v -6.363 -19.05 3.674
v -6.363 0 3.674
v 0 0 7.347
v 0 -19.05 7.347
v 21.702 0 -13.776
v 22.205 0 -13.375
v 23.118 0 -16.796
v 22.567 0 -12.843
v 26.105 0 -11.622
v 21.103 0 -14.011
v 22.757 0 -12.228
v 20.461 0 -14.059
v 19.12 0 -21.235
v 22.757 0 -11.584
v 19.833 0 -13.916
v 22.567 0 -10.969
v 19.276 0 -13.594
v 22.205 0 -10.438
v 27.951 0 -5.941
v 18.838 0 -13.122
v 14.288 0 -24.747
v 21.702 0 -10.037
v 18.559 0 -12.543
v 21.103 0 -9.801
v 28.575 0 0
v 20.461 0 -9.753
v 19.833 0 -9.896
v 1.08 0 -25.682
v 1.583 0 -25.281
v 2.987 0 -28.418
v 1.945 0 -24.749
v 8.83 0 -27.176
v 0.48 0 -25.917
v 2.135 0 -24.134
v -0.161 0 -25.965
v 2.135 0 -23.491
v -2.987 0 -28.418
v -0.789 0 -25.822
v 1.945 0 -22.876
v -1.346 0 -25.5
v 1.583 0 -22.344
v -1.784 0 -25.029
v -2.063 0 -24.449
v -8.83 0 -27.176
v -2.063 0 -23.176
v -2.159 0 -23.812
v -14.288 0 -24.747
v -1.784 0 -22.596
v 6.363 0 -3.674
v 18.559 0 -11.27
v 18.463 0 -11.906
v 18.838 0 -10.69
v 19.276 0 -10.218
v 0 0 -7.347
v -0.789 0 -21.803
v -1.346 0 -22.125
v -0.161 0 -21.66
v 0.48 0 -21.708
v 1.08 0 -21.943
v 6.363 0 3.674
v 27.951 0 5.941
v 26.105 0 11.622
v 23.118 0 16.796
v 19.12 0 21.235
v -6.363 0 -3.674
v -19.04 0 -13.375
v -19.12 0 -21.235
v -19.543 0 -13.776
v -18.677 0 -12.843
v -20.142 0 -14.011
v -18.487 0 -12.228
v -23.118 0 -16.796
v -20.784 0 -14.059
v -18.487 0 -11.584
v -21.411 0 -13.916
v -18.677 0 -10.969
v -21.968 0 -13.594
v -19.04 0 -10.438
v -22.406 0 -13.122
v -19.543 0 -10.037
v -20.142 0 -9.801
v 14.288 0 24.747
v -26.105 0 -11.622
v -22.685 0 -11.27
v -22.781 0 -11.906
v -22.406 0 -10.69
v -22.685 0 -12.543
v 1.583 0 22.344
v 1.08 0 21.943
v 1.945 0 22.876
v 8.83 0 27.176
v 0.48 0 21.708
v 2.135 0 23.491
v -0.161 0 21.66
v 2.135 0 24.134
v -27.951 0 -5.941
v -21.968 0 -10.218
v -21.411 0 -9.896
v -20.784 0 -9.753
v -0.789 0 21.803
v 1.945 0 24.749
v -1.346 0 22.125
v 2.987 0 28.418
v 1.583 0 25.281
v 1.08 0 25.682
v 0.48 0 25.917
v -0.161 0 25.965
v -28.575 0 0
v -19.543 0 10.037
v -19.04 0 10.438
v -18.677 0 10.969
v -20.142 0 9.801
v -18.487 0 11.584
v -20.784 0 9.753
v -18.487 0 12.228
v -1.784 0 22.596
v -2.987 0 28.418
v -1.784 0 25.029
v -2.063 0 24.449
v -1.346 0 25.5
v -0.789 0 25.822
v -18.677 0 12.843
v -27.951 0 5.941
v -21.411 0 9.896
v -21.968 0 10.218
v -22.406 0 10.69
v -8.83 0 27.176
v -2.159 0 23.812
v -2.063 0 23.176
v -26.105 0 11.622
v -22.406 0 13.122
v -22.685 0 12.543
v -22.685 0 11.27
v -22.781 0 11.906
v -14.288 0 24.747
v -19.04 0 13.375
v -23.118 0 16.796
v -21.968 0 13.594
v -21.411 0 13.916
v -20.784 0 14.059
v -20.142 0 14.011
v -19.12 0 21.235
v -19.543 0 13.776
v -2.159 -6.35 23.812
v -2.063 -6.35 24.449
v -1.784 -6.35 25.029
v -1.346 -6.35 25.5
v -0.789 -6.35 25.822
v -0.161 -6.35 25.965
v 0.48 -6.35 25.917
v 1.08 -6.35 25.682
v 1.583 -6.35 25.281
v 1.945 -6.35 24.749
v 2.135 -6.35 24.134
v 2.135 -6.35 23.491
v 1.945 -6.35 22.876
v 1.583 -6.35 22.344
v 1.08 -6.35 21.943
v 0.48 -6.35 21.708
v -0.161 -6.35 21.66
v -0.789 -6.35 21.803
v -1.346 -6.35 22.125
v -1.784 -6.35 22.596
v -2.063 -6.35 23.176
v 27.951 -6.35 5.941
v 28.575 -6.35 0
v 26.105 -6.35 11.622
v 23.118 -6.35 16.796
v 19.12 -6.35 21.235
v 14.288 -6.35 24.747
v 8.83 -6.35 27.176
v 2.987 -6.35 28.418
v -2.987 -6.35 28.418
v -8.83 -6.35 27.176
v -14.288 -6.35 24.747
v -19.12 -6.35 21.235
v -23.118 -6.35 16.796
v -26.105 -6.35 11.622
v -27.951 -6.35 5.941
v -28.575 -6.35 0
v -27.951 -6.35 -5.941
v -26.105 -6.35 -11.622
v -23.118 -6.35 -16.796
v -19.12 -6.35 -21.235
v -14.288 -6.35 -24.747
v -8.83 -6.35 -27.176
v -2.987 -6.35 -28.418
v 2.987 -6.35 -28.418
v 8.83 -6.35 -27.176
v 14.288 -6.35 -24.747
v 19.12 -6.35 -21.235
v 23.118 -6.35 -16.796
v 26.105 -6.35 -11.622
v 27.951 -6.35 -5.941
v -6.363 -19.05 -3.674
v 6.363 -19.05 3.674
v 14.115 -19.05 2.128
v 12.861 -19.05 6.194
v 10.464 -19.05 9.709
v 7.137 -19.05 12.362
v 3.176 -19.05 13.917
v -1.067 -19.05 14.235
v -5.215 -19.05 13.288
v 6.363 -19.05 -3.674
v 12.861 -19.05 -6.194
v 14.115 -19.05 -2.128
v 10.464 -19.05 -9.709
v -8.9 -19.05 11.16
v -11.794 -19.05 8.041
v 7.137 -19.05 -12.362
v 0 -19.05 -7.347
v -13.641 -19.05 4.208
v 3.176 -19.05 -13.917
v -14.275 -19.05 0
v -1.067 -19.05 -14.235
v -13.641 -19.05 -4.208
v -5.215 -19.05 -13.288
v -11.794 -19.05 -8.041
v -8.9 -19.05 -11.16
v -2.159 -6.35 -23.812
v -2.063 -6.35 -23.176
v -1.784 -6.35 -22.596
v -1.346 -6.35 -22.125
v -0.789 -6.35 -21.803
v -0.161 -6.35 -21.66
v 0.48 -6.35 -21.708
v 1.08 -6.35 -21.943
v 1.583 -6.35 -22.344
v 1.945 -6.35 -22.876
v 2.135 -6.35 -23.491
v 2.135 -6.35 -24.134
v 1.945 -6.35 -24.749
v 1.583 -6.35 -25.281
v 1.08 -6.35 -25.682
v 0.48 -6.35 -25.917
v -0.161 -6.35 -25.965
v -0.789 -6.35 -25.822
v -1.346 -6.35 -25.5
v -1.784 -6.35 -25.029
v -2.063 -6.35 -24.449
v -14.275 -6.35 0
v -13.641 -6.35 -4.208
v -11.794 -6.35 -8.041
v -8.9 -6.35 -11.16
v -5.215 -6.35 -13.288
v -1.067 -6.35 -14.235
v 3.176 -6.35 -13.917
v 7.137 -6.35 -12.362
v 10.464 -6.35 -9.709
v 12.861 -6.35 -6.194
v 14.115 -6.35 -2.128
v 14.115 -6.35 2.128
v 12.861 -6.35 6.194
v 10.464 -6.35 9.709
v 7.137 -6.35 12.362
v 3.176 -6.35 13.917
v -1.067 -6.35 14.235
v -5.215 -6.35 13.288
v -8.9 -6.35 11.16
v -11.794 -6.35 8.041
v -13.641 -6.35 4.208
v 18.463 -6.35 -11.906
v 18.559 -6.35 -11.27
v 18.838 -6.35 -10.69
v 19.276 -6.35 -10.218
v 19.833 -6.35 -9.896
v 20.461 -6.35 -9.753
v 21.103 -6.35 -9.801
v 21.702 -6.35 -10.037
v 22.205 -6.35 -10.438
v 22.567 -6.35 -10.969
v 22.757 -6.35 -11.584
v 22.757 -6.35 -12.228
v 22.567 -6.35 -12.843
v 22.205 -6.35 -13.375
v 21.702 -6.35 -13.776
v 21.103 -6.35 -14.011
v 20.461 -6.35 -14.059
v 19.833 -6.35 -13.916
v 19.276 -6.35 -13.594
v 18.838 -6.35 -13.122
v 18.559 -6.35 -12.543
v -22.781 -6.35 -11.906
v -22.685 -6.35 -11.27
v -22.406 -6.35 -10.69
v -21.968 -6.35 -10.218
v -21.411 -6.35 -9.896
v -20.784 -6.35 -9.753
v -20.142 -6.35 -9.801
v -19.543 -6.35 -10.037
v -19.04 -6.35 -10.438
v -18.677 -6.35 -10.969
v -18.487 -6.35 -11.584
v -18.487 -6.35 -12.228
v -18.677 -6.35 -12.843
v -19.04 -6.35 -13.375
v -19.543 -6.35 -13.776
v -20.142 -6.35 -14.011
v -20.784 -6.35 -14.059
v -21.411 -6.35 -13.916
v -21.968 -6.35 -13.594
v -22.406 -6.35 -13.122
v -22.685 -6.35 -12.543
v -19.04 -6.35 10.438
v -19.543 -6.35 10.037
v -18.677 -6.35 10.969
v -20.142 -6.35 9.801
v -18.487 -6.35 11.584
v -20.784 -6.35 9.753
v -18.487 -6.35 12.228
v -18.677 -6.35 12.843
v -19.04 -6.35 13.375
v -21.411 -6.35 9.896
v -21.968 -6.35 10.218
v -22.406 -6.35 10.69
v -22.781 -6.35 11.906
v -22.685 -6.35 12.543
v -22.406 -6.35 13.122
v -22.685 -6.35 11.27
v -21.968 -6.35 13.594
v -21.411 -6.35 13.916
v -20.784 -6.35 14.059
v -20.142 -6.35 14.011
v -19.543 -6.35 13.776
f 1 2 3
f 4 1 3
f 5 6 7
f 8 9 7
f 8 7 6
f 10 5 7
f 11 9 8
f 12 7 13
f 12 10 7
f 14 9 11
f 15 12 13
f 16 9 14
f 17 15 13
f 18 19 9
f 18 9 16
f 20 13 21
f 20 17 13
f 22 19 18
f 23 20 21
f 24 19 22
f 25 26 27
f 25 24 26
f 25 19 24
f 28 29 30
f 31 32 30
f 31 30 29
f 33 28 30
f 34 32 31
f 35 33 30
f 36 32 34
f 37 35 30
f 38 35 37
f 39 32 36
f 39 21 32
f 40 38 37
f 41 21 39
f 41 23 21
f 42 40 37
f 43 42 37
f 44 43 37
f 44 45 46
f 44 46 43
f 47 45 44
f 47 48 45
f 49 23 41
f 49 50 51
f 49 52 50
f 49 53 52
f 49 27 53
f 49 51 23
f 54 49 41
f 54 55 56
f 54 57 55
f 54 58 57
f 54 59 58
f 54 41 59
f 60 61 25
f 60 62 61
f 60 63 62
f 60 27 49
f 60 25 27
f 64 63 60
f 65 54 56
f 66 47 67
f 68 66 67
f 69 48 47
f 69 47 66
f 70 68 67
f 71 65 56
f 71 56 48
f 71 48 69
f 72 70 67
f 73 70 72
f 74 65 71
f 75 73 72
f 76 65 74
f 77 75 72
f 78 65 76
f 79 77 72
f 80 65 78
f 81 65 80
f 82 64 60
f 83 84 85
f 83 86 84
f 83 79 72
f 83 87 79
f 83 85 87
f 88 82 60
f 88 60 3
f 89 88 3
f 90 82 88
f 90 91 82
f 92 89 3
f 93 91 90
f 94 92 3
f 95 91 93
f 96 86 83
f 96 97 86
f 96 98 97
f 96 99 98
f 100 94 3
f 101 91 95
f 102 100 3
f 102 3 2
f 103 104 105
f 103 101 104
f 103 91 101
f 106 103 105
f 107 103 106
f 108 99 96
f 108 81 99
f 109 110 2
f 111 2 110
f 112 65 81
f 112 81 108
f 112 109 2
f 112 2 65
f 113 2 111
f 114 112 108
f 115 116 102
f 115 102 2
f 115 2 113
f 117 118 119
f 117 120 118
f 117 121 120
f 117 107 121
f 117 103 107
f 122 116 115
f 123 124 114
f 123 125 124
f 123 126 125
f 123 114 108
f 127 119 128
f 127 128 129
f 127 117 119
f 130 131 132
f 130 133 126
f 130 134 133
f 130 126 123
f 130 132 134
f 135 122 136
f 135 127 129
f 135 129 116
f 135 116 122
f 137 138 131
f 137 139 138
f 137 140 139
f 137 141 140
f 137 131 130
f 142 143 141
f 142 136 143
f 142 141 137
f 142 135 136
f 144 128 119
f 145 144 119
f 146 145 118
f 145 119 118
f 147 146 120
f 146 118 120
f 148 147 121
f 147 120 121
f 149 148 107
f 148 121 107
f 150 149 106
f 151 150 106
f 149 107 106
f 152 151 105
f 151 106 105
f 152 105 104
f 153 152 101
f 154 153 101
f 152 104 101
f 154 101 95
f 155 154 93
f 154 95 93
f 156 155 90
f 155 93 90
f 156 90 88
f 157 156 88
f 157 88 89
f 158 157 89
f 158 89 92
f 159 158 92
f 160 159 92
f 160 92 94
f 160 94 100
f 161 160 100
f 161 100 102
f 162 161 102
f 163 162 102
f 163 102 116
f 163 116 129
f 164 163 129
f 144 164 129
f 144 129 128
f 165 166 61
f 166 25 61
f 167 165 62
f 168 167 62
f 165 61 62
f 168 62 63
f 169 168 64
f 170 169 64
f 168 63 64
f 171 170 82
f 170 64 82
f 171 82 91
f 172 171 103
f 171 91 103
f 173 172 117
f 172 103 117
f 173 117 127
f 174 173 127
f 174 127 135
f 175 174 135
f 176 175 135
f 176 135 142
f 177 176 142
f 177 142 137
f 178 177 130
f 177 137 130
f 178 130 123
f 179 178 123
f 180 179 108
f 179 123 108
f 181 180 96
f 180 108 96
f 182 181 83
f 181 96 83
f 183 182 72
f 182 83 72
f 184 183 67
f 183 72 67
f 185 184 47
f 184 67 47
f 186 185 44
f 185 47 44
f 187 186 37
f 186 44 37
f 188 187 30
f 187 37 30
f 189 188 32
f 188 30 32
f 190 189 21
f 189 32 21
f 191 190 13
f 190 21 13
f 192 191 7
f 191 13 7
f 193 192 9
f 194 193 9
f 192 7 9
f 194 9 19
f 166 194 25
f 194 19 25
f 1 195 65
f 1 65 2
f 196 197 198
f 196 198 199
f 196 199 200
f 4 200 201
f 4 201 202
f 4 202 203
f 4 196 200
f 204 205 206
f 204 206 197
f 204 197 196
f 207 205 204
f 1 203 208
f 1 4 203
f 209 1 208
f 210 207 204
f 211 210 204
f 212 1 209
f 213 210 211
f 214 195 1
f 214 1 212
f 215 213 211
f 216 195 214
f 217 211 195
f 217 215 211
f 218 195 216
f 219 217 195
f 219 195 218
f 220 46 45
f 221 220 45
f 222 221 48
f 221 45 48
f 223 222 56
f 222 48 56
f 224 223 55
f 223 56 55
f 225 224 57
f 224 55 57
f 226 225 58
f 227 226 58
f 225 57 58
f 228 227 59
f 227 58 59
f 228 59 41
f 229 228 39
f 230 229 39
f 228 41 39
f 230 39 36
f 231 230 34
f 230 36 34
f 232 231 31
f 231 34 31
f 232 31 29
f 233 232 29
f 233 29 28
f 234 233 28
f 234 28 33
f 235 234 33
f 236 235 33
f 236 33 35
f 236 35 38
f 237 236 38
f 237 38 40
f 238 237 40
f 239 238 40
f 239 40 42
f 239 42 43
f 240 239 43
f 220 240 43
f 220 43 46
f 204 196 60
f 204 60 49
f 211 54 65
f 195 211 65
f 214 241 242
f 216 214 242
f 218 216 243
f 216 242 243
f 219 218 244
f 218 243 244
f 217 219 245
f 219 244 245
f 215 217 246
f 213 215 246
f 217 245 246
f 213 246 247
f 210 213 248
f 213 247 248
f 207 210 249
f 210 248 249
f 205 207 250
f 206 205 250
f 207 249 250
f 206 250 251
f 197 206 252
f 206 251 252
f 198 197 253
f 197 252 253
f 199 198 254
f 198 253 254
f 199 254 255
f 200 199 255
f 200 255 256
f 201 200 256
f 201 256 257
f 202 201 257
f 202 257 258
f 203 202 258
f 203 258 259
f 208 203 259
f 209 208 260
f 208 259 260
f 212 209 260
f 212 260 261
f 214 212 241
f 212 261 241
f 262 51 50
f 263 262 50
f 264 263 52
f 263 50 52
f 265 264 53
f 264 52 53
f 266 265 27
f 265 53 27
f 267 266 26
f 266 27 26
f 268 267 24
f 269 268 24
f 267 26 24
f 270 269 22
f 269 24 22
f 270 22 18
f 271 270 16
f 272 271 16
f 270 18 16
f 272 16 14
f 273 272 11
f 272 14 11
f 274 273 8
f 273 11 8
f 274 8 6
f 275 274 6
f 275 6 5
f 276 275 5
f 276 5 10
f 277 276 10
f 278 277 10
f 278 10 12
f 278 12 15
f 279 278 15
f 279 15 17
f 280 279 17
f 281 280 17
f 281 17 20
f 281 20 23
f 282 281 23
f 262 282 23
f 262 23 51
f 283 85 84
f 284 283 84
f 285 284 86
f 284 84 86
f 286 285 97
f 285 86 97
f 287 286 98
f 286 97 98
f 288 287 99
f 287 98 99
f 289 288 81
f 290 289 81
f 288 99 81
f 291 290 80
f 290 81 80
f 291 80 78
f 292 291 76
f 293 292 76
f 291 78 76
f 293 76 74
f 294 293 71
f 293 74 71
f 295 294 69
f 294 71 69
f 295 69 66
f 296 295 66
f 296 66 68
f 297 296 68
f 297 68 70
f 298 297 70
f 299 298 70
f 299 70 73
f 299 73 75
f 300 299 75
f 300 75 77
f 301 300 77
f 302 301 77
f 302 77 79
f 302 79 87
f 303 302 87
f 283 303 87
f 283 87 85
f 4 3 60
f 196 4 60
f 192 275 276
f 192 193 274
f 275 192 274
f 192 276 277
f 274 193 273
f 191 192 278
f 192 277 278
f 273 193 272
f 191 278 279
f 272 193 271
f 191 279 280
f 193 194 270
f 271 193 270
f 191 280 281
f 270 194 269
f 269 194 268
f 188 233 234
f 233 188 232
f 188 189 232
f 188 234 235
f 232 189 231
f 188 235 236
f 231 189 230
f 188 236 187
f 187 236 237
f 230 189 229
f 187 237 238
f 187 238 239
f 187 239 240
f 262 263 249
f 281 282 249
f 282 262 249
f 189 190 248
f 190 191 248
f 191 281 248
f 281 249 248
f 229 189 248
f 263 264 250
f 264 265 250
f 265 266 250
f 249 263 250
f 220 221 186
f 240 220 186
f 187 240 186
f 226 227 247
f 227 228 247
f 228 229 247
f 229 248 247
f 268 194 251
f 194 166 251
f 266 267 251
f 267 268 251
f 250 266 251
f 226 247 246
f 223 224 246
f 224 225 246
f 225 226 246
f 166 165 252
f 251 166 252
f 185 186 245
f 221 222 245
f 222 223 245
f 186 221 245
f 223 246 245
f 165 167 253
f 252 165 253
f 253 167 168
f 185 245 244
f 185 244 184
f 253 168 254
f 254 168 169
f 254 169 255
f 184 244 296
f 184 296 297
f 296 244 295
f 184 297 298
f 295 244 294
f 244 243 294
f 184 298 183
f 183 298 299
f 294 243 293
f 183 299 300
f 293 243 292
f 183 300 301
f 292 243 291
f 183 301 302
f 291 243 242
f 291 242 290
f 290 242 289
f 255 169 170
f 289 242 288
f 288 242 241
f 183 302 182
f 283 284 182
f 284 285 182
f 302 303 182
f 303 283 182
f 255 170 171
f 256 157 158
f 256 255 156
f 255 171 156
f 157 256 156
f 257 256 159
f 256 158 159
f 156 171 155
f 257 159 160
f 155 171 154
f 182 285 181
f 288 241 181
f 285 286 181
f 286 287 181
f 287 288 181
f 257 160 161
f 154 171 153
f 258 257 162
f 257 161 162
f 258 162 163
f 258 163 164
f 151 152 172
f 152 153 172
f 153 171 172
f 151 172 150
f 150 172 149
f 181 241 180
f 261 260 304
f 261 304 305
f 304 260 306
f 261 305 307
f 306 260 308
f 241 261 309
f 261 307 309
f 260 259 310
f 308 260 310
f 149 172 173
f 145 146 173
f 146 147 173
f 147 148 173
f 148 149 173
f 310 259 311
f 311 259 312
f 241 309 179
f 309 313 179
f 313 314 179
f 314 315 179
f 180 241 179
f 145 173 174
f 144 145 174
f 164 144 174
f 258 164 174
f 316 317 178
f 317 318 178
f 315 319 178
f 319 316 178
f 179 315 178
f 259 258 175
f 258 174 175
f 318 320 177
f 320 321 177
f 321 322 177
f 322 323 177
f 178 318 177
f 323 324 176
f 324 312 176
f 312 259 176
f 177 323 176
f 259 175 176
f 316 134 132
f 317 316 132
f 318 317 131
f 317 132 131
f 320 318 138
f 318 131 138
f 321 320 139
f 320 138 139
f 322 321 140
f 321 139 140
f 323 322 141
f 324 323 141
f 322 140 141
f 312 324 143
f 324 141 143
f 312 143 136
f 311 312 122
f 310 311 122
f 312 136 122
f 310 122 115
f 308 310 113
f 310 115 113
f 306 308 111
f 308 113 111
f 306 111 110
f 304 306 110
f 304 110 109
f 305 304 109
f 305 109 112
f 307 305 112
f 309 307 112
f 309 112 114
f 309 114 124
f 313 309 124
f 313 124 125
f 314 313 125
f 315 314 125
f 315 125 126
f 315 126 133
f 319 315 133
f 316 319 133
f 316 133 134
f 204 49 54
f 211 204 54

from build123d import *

# Parameters (mm, degrees)
SKETCH1_W             = 28.575
SKETCH1_H             = 6.35
SKETCH2_R             = 14.2748
BOSS_EXTRUDE1_DEPTH   = 12.7
CUT_EXTRUDE1_DEPTH    = 45.676210112
F_8_CLEARANCE_HOLE1_D = 4.318


with BuildPart() as part:
    # Sketch1 → Revolve1 (revolve)
    with BuildSketch(Plane.XY):
        with Locations((14.2875, -3.175)):
            Rectangle(SKETCH1_W, SKETCH1_H)
    revolve(axis=Axis((0, 0, 0), (0, -1, 0)))

    # Sketch2 → Boss-Extrude1 (add)
    with BuildSketch(Plane.XZ.offset(6.35)):
        with Locations(Location((0, 0, 0), (0, 0, 180))):
            Circle(SKETCH2_R)
    extrude(amount=BOSS_EXTRUDE1_DEPTH)

    # Sketch3 → Cut-Extrude1 (cut, through all)
    with BuildSketch(Plane(origin=(0, 0, 0), x_dir=(-1, 0, 0), z_dir=(0, 1, 0))):
        Polygon((0, -7.347013116), (6.3627, -3.673506558), (6.3627, 3.673506558), (0, 7.347013116), (-6.3627, 3.673506558), (-6.3627, -3.673506558), align=None)
    extrude(amount=-CUT_EXTRUDE1_DEPTH, mode=Mode.SUBTRACT)

    # #8 Clearance Hole1 (through all)
    with Locations(Plane.XZ.offset(6.35)):
        with Locations((-20.622229928, -11.90625), (0, 23.8125), (0, -23.8125), (-20.622229928, 11.90625), (20.622229928, -11.90625)):
            Hole(F_8_CLEARANCE_HOLE1_D / 2)


solid = part.part
